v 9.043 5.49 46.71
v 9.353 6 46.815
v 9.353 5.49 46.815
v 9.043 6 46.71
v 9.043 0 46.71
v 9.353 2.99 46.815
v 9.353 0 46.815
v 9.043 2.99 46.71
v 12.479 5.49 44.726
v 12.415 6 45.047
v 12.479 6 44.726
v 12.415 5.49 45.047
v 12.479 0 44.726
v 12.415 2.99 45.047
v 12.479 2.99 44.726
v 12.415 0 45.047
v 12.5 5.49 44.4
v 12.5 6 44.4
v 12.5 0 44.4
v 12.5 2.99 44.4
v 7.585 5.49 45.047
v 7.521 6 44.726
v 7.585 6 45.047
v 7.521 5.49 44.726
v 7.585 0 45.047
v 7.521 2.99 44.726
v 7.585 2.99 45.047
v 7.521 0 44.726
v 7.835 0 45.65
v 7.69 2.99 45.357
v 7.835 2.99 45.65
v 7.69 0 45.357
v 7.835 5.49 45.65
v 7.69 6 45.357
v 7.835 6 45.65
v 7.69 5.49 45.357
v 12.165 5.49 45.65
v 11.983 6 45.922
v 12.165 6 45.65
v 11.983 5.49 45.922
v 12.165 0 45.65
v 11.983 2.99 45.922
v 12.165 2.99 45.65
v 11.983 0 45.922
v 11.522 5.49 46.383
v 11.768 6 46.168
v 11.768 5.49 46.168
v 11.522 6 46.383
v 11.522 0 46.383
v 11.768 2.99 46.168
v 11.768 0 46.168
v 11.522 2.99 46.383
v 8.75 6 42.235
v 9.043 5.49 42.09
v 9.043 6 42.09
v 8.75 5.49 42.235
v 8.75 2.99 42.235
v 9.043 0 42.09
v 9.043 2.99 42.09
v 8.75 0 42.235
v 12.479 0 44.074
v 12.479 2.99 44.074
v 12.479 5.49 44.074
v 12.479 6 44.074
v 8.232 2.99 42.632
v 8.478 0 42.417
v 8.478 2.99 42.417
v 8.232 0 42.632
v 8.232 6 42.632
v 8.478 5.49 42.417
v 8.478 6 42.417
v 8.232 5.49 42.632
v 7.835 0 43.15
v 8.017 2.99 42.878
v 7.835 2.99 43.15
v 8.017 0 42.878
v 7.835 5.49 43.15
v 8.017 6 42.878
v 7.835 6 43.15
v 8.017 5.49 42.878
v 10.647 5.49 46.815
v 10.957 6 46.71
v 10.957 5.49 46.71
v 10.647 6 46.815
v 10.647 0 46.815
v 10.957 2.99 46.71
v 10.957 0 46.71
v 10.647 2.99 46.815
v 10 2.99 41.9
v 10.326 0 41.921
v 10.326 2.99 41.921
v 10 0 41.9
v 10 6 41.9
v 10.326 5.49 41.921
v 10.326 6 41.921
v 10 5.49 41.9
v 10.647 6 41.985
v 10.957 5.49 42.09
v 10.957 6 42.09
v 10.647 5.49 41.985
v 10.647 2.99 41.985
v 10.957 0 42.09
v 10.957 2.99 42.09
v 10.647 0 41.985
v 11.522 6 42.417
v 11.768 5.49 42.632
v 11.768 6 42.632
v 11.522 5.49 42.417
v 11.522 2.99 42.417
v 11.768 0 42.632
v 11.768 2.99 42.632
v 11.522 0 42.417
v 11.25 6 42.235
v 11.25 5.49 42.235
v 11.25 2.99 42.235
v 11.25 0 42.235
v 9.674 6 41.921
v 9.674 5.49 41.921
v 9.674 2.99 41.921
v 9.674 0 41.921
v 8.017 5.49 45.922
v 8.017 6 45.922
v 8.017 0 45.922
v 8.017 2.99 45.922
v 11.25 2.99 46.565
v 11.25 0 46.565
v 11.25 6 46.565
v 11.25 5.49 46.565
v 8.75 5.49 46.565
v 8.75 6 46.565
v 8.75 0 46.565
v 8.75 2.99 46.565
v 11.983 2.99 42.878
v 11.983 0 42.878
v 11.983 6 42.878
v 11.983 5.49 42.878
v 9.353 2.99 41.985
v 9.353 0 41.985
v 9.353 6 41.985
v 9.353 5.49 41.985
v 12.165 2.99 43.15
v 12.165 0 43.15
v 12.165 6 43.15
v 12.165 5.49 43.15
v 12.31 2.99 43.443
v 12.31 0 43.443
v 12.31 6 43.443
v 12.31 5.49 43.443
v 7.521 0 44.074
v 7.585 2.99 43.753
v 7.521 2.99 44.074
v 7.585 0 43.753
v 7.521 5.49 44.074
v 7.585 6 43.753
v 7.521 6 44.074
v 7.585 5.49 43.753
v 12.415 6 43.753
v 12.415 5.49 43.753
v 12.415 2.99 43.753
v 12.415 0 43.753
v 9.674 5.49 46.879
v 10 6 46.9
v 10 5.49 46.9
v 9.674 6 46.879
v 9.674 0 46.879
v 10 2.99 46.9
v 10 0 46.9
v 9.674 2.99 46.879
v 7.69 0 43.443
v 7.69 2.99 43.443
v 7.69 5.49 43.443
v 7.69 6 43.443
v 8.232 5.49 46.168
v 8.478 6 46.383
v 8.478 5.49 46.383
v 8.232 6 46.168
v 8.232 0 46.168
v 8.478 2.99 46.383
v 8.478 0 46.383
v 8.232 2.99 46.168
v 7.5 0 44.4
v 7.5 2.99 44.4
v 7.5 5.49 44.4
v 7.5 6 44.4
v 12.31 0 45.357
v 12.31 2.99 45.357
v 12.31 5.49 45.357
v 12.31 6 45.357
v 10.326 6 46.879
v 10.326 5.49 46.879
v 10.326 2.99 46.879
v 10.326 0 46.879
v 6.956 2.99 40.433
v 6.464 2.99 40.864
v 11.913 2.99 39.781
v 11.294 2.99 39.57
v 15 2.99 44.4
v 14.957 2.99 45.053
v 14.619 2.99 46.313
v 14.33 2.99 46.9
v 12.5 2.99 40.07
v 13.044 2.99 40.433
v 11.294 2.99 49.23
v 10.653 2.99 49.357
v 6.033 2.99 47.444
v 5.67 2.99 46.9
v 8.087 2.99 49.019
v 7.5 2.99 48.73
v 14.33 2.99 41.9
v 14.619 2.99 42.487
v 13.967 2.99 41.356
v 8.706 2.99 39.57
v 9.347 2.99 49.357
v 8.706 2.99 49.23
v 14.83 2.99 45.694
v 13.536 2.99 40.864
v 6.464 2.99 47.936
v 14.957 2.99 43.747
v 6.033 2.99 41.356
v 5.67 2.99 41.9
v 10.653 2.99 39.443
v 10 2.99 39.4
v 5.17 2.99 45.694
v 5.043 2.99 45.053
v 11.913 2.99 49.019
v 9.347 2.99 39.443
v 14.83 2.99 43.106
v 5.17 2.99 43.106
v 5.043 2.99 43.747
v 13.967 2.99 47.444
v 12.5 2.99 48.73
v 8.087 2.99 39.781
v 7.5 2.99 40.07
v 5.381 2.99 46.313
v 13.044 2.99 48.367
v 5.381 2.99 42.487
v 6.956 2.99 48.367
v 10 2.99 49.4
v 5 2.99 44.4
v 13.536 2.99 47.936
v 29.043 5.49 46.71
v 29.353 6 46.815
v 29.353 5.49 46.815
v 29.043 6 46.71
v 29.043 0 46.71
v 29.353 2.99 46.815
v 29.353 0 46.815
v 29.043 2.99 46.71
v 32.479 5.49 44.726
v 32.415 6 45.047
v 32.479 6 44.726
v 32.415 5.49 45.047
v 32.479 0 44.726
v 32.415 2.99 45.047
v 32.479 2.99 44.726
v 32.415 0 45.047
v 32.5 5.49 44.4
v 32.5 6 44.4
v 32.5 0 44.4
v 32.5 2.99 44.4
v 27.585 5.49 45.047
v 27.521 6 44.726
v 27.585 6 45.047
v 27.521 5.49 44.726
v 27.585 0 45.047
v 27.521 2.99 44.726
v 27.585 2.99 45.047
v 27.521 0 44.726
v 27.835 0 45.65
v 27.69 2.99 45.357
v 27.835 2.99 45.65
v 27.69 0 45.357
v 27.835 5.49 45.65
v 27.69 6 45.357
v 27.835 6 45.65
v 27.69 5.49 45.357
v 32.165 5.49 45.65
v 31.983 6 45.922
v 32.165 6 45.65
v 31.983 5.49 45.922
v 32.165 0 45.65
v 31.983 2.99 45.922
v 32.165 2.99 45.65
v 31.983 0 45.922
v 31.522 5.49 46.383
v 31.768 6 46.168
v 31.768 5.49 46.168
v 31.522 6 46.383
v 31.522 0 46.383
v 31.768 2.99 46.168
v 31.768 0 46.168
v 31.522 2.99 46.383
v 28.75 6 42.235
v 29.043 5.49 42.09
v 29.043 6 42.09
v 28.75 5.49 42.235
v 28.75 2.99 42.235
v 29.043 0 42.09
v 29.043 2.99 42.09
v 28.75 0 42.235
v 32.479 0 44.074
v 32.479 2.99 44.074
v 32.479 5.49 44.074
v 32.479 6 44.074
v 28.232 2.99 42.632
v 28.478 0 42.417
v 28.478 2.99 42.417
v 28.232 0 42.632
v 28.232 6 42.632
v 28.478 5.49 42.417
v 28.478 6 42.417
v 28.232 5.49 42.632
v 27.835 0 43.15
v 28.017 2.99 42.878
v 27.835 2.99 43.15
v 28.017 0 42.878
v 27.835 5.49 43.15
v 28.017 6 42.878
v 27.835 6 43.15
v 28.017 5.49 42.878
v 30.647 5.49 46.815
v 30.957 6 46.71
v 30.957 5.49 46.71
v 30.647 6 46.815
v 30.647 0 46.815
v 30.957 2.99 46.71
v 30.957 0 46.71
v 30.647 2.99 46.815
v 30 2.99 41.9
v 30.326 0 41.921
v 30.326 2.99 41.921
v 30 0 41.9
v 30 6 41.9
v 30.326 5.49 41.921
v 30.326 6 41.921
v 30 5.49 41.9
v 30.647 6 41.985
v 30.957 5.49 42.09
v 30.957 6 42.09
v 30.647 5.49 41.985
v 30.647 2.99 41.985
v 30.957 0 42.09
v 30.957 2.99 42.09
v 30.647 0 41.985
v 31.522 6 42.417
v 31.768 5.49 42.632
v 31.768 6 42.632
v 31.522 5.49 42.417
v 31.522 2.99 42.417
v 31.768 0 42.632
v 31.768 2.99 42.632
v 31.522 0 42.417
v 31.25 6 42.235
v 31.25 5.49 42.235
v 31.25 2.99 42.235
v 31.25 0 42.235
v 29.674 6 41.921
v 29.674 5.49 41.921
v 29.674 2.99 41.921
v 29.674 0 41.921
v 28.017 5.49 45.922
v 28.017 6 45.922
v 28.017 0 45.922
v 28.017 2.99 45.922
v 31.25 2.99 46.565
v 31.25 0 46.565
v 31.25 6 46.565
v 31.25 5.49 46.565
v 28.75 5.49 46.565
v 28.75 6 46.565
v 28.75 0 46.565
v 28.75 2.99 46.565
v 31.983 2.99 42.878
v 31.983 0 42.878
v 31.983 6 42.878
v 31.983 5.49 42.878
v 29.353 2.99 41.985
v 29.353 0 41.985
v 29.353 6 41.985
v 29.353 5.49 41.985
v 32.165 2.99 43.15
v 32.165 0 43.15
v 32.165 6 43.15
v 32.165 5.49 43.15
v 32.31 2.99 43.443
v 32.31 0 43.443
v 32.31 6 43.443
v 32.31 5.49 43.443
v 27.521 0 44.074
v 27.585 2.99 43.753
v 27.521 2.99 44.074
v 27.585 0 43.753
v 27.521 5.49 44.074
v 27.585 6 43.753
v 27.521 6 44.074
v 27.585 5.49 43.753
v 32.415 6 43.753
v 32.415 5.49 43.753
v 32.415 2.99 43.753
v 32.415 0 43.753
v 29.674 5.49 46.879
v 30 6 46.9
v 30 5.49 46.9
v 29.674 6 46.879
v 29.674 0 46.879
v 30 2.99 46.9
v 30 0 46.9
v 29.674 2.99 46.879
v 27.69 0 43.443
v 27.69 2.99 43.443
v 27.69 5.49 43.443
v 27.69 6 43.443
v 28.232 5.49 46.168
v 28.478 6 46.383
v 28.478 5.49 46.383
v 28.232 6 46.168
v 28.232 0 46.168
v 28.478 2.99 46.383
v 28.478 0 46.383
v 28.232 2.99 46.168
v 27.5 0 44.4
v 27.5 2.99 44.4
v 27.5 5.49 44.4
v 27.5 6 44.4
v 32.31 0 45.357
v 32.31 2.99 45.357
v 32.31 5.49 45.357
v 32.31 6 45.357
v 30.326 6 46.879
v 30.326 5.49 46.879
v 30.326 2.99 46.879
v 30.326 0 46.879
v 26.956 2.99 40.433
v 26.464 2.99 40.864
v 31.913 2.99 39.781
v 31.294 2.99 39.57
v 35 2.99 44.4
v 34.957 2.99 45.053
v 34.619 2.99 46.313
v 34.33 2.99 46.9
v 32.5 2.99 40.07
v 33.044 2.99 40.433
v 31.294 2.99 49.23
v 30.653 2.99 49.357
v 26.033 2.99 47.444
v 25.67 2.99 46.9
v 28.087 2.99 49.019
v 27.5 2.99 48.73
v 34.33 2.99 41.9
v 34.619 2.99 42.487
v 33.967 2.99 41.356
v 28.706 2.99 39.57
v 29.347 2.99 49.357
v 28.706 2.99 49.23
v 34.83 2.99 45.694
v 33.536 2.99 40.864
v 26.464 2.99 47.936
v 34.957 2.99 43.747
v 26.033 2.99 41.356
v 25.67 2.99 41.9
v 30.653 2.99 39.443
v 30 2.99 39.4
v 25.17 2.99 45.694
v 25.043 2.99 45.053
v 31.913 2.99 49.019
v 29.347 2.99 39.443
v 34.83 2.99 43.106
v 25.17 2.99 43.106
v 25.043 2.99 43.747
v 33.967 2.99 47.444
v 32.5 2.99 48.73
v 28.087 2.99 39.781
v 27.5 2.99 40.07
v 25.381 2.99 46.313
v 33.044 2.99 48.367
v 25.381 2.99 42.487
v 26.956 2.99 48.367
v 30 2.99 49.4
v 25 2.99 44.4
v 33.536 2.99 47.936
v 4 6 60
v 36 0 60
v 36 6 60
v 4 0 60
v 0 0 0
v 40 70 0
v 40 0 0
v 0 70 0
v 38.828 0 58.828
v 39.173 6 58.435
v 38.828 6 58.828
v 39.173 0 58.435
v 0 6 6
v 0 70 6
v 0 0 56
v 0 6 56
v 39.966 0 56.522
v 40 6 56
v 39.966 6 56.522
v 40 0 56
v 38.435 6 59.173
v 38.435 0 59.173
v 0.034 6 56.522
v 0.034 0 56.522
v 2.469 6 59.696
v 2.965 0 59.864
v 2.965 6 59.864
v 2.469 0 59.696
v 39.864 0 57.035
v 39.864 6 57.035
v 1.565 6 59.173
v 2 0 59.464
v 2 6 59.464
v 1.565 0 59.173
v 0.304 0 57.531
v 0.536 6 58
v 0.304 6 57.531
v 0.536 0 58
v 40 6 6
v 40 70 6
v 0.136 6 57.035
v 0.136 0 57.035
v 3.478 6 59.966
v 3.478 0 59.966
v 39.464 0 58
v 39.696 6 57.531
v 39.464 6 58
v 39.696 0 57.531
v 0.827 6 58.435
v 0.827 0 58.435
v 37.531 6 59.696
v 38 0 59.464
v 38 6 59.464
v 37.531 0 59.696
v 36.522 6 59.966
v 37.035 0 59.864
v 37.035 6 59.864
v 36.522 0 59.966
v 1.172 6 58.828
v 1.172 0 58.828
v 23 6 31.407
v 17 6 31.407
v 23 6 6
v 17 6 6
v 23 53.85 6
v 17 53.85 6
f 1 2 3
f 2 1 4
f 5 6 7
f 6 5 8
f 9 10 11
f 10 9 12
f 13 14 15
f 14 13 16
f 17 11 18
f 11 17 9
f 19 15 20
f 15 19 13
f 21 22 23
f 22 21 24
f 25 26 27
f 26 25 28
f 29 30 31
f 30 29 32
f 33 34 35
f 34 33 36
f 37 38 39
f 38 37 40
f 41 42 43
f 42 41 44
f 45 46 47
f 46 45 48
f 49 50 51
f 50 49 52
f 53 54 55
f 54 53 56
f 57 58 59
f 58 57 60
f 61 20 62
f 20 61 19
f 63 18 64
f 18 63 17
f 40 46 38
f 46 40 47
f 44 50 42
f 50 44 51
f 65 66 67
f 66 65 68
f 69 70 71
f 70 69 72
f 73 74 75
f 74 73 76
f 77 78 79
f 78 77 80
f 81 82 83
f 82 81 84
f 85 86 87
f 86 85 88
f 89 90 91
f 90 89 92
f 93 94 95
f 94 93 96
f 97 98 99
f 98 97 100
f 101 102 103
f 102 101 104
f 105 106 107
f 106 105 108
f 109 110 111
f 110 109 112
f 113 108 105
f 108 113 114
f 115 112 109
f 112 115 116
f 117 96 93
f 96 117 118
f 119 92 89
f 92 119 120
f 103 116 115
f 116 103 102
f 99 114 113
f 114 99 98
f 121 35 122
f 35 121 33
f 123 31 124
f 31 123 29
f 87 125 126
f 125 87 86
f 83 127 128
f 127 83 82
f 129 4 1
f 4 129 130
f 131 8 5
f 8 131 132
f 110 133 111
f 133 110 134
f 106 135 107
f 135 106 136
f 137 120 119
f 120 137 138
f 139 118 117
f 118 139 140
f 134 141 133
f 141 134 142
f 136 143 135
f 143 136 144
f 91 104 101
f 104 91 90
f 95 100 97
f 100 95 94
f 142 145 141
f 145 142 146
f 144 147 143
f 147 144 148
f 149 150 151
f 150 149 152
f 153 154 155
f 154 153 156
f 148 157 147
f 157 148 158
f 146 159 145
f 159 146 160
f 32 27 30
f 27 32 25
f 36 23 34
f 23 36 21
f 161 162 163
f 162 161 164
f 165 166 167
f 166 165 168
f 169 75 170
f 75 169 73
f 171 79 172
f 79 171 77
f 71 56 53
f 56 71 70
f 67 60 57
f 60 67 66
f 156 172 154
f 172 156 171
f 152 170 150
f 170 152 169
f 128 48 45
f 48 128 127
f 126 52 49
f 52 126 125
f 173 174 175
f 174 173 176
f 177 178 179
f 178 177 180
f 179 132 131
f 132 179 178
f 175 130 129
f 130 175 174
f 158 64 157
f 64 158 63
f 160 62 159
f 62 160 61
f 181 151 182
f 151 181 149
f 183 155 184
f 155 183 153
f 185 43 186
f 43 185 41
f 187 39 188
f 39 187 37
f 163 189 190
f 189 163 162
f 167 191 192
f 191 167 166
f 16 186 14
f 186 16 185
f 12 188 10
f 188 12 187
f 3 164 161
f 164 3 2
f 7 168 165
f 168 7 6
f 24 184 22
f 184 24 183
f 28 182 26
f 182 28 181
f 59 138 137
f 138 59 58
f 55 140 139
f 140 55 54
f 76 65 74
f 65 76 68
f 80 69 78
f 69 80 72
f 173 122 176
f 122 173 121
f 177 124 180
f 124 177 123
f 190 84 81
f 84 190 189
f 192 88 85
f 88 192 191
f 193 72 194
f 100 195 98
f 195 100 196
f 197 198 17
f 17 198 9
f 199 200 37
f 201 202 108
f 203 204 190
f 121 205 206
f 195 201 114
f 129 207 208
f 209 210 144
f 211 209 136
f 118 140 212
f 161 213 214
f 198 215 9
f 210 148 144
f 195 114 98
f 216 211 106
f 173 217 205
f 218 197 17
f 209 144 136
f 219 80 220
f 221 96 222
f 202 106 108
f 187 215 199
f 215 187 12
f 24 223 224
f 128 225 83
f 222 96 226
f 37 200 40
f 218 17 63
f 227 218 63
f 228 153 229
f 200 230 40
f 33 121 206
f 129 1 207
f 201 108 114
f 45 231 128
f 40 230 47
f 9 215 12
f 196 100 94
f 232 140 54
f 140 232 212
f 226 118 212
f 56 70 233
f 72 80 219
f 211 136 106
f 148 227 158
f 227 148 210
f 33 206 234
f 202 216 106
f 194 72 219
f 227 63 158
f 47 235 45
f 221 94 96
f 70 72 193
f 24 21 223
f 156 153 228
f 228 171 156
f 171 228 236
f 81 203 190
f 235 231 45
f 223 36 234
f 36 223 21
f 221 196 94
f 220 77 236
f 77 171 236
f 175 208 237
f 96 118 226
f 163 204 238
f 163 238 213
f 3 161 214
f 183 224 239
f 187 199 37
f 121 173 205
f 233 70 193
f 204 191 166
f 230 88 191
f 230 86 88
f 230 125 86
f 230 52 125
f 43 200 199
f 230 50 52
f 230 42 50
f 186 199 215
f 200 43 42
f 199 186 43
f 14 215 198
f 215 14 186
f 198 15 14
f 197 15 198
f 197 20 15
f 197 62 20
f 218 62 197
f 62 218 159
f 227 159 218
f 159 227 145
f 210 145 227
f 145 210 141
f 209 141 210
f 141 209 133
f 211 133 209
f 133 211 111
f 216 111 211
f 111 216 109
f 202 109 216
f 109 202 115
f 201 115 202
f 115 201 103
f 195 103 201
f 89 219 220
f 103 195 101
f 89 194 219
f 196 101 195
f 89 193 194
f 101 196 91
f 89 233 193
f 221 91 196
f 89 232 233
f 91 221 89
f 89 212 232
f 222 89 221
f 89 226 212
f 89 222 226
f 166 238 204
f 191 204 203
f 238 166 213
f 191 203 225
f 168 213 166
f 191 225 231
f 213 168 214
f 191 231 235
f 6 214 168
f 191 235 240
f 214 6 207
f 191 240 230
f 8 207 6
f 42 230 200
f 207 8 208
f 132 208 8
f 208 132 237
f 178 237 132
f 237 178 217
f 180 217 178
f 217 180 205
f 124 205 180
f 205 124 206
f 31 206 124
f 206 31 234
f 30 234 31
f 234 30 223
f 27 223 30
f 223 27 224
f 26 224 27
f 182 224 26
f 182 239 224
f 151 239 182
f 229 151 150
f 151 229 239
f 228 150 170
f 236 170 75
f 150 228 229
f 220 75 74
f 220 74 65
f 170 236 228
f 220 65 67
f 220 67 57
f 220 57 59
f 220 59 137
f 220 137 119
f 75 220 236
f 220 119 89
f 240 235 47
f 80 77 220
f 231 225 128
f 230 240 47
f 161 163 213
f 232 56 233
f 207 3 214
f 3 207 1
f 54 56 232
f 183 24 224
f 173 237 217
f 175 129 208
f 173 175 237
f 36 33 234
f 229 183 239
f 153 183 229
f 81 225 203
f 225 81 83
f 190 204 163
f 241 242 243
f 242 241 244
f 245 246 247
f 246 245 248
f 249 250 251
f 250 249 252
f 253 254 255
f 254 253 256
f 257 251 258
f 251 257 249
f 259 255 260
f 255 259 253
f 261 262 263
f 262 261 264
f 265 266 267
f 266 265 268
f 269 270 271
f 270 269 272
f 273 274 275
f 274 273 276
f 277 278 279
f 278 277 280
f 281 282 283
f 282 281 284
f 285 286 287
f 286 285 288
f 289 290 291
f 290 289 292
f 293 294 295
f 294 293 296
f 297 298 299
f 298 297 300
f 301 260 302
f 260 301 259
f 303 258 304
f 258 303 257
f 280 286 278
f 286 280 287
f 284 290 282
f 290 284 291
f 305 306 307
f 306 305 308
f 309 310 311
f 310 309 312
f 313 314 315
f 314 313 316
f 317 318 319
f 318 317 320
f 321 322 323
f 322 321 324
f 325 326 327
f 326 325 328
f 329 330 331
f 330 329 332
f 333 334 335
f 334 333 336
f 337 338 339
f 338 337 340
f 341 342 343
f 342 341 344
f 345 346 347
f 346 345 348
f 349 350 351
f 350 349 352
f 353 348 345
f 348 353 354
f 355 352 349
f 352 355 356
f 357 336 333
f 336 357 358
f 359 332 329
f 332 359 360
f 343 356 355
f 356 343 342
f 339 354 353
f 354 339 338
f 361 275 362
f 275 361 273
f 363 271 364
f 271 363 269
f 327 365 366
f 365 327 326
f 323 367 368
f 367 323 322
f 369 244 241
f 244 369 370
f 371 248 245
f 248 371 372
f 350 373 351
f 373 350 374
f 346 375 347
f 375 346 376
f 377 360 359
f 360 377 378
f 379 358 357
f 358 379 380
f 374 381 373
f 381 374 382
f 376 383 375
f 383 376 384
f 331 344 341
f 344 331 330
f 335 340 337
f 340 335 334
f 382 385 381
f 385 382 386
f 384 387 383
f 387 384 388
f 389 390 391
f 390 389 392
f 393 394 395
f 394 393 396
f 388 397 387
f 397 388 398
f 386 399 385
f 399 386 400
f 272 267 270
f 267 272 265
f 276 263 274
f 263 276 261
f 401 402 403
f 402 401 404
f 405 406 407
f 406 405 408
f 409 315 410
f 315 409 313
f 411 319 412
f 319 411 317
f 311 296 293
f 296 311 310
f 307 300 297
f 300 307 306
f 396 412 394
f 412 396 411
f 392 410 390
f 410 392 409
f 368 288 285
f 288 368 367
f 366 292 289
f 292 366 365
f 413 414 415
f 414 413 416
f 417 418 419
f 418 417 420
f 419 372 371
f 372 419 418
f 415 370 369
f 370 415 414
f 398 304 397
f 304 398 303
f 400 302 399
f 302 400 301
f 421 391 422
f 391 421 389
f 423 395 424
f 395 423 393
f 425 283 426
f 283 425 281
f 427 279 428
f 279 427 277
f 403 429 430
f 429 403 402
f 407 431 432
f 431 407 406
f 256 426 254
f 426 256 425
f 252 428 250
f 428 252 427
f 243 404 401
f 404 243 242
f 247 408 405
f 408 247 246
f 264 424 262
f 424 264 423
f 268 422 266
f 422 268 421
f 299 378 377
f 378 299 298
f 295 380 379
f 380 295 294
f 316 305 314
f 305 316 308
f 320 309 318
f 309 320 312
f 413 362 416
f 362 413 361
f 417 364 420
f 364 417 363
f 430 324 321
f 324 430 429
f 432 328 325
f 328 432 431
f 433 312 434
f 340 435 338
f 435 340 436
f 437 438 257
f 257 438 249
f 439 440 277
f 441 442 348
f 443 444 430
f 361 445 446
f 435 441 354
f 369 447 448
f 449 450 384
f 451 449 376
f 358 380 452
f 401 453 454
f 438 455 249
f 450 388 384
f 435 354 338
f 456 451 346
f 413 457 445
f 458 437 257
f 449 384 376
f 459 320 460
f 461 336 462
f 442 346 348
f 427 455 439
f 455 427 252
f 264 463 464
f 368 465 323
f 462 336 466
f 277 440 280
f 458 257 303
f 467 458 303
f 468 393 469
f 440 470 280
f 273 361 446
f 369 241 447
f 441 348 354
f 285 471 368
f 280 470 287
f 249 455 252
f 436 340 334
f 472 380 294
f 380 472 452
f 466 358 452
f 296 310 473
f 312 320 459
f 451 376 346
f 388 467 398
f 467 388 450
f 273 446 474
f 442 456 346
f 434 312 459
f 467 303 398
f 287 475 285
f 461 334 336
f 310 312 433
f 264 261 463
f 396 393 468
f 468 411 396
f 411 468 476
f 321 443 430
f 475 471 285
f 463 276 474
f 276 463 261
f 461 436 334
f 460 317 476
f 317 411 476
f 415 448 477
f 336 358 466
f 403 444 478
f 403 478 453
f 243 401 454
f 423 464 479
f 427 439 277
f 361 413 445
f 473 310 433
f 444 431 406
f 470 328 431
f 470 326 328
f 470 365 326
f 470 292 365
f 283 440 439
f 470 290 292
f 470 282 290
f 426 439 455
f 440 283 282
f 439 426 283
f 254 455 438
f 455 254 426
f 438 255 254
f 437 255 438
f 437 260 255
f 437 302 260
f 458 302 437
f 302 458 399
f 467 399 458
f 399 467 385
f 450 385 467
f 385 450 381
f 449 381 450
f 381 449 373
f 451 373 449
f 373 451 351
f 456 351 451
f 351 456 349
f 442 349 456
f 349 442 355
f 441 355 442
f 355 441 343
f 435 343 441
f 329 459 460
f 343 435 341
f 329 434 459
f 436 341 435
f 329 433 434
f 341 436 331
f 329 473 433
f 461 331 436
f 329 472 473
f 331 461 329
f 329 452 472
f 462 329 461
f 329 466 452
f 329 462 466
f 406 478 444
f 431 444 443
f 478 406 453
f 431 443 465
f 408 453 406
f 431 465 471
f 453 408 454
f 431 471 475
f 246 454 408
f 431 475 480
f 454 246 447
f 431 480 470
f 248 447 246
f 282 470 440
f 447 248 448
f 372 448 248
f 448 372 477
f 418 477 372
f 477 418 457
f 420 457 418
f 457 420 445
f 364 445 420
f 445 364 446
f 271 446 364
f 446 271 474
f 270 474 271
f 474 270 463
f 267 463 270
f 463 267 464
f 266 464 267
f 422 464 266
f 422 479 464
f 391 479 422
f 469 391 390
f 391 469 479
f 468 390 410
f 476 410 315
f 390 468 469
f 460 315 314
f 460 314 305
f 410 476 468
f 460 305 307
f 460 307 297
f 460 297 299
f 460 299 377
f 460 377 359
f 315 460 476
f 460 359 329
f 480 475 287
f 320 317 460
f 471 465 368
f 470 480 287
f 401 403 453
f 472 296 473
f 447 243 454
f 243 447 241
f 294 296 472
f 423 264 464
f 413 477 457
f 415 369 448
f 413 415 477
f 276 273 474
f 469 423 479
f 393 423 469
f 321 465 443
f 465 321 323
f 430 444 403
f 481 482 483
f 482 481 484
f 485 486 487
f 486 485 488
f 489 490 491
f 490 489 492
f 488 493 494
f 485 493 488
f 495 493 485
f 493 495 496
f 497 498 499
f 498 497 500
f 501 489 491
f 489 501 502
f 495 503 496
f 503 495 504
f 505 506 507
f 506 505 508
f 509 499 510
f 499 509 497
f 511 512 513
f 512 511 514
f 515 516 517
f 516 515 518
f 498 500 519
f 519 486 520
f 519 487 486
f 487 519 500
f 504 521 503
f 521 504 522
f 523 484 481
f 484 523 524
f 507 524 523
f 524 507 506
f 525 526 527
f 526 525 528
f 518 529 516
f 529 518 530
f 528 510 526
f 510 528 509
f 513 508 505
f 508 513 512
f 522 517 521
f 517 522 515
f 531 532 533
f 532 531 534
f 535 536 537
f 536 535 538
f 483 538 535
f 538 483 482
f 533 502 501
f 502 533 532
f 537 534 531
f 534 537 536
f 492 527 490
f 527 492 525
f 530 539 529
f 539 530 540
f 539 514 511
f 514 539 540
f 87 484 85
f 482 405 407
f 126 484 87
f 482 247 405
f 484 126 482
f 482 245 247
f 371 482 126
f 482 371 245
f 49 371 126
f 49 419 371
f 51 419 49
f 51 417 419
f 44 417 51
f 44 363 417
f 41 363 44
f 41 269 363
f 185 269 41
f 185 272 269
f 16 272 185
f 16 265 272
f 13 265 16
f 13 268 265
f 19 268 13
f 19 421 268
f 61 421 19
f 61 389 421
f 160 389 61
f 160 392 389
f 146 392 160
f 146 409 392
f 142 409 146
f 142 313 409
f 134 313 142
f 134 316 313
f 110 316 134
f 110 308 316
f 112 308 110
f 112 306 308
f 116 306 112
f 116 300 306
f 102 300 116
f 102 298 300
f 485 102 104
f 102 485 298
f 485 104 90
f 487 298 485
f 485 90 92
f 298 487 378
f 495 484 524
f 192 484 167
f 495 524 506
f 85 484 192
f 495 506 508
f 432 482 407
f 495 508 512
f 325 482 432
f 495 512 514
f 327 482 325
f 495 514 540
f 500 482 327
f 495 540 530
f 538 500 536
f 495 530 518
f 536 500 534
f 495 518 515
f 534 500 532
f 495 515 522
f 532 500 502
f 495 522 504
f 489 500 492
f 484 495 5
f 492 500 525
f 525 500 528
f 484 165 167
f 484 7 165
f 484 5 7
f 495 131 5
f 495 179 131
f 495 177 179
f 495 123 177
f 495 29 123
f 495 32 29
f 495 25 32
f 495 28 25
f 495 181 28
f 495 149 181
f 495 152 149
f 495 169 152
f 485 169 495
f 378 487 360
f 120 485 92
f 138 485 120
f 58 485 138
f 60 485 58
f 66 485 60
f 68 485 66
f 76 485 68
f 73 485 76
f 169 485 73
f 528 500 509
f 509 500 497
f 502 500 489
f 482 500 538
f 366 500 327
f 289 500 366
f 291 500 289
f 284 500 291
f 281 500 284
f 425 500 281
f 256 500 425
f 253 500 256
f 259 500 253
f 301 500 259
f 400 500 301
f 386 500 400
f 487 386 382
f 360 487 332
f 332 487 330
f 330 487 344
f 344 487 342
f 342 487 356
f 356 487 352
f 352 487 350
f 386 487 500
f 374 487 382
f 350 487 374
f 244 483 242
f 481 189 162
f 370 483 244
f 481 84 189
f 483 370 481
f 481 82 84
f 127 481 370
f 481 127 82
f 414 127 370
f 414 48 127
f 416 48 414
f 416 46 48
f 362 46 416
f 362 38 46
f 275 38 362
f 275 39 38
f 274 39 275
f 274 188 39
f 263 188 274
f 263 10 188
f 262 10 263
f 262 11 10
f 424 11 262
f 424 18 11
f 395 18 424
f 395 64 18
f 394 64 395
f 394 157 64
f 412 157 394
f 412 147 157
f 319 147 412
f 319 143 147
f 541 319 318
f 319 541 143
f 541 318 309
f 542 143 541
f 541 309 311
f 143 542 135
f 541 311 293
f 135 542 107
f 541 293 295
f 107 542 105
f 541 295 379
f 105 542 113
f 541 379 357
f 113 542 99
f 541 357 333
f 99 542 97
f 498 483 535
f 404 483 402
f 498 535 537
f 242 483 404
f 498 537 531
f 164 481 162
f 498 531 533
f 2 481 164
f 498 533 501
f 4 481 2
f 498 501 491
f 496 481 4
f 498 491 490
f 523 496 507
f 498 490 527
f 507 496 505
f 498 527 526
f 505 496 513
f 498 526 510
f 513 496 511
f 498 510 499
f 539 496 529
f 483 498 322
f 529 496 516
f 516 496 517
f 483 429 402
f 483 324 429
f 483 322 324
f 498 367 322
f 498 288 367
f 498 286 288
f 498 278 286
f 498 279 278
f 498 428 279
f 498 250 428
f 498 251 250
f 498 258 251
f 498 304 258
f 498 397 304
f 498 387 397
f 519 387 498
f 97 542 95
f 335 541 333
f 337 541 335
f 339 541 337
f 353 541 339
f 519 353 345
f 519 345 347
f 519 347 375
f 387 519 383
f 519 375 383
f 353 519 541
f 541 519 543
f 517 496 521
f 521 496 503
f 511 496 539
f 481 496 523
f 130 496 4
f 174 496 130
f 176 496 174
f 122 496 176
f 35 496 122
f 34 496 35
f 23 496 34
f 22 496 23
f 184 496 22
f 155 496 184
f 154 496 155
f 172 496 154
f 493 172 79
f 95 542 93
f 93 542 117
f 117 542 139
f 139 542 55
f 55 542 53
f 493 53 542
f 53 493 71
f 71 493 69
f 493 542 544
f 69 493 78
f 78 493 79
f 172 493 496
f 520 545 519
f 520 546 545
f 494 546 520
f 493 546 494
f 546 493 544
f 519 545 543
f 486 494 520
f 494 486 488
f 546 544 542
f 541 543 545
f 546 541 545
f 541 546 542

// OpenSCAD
// Wall bracket with a gusset, written by Innerscene (CC0 1.0).
// Every value below the Customizer comments can be changed and the viewer
// rebuilds the part.

/* [Bracket] */
// Width of the bracket along the wall, in mm
width = 40; // [20:5:80]
// Length of the shelf arm, in mm
arm = 70; // [40:5:120]
// Height of the wall plate, in mm
plate_height = 60; // [30:5:100]
// Thickness of the plate and arm, in mm
thickness = 6; // [3:1:12]

/* [Screws] */
// Screw hole diameter, in mm
hole = 5; // [3:0.5:8]
// Countersink diameter, in mm
head = 10; // [6:0.5:14]

/* [Quality] */
$fn = 48;

module countersunk_hole(d, head_d, depth) {
    cylinder(d = d, h = depth * 3, center = true);
    translate([0, 0, depth / 2 - head_d / 4 + 0.01])
        cylinder(d1 = d, d2 = head_d, h = (head_d - d) / 2);
}

module plate() {
    difference() {
        // wall plate with rounded top corners
        hull() {
            translate([0, 0, 0]) cube([width, thickness, 1]);
            for (x = [4, width - 4])
                translate([x, 0, plate_height - 4])
                    rotate([-90, 0, 0]) cylinder(r = 4, h = thickness);
        }
        // two countersunk screws, coming in from the front, above the gusset
        for (x = [width * 0.25, width * 0.75])
            translate([x, thickness, plate_height * 0.74])
                rotate([90, 0, 0]) countersunk_hole(hole, head, thickness);
    }
}

module arm_with_gusset() {
    // the shelf arm
    translate([0, 0, 0]) cube([width, arm, thickness]);
    // triangular gusset between the plate and the arm, sunk into both so the faces do not coincide
    translate([width / 2 - thickness / 2, 0, 0])
        rotate([90, 0, 90])
            linear_extrude(height = thickness)
                polygon([[thickness / 2, thickness / 2], [arm * 0.85, thickness / 2], [thickness / 2, plate_height * 0.55]]);
}

color("SteelBlue") plate();
color("LightSteelBlue") arm_with_gusset();
